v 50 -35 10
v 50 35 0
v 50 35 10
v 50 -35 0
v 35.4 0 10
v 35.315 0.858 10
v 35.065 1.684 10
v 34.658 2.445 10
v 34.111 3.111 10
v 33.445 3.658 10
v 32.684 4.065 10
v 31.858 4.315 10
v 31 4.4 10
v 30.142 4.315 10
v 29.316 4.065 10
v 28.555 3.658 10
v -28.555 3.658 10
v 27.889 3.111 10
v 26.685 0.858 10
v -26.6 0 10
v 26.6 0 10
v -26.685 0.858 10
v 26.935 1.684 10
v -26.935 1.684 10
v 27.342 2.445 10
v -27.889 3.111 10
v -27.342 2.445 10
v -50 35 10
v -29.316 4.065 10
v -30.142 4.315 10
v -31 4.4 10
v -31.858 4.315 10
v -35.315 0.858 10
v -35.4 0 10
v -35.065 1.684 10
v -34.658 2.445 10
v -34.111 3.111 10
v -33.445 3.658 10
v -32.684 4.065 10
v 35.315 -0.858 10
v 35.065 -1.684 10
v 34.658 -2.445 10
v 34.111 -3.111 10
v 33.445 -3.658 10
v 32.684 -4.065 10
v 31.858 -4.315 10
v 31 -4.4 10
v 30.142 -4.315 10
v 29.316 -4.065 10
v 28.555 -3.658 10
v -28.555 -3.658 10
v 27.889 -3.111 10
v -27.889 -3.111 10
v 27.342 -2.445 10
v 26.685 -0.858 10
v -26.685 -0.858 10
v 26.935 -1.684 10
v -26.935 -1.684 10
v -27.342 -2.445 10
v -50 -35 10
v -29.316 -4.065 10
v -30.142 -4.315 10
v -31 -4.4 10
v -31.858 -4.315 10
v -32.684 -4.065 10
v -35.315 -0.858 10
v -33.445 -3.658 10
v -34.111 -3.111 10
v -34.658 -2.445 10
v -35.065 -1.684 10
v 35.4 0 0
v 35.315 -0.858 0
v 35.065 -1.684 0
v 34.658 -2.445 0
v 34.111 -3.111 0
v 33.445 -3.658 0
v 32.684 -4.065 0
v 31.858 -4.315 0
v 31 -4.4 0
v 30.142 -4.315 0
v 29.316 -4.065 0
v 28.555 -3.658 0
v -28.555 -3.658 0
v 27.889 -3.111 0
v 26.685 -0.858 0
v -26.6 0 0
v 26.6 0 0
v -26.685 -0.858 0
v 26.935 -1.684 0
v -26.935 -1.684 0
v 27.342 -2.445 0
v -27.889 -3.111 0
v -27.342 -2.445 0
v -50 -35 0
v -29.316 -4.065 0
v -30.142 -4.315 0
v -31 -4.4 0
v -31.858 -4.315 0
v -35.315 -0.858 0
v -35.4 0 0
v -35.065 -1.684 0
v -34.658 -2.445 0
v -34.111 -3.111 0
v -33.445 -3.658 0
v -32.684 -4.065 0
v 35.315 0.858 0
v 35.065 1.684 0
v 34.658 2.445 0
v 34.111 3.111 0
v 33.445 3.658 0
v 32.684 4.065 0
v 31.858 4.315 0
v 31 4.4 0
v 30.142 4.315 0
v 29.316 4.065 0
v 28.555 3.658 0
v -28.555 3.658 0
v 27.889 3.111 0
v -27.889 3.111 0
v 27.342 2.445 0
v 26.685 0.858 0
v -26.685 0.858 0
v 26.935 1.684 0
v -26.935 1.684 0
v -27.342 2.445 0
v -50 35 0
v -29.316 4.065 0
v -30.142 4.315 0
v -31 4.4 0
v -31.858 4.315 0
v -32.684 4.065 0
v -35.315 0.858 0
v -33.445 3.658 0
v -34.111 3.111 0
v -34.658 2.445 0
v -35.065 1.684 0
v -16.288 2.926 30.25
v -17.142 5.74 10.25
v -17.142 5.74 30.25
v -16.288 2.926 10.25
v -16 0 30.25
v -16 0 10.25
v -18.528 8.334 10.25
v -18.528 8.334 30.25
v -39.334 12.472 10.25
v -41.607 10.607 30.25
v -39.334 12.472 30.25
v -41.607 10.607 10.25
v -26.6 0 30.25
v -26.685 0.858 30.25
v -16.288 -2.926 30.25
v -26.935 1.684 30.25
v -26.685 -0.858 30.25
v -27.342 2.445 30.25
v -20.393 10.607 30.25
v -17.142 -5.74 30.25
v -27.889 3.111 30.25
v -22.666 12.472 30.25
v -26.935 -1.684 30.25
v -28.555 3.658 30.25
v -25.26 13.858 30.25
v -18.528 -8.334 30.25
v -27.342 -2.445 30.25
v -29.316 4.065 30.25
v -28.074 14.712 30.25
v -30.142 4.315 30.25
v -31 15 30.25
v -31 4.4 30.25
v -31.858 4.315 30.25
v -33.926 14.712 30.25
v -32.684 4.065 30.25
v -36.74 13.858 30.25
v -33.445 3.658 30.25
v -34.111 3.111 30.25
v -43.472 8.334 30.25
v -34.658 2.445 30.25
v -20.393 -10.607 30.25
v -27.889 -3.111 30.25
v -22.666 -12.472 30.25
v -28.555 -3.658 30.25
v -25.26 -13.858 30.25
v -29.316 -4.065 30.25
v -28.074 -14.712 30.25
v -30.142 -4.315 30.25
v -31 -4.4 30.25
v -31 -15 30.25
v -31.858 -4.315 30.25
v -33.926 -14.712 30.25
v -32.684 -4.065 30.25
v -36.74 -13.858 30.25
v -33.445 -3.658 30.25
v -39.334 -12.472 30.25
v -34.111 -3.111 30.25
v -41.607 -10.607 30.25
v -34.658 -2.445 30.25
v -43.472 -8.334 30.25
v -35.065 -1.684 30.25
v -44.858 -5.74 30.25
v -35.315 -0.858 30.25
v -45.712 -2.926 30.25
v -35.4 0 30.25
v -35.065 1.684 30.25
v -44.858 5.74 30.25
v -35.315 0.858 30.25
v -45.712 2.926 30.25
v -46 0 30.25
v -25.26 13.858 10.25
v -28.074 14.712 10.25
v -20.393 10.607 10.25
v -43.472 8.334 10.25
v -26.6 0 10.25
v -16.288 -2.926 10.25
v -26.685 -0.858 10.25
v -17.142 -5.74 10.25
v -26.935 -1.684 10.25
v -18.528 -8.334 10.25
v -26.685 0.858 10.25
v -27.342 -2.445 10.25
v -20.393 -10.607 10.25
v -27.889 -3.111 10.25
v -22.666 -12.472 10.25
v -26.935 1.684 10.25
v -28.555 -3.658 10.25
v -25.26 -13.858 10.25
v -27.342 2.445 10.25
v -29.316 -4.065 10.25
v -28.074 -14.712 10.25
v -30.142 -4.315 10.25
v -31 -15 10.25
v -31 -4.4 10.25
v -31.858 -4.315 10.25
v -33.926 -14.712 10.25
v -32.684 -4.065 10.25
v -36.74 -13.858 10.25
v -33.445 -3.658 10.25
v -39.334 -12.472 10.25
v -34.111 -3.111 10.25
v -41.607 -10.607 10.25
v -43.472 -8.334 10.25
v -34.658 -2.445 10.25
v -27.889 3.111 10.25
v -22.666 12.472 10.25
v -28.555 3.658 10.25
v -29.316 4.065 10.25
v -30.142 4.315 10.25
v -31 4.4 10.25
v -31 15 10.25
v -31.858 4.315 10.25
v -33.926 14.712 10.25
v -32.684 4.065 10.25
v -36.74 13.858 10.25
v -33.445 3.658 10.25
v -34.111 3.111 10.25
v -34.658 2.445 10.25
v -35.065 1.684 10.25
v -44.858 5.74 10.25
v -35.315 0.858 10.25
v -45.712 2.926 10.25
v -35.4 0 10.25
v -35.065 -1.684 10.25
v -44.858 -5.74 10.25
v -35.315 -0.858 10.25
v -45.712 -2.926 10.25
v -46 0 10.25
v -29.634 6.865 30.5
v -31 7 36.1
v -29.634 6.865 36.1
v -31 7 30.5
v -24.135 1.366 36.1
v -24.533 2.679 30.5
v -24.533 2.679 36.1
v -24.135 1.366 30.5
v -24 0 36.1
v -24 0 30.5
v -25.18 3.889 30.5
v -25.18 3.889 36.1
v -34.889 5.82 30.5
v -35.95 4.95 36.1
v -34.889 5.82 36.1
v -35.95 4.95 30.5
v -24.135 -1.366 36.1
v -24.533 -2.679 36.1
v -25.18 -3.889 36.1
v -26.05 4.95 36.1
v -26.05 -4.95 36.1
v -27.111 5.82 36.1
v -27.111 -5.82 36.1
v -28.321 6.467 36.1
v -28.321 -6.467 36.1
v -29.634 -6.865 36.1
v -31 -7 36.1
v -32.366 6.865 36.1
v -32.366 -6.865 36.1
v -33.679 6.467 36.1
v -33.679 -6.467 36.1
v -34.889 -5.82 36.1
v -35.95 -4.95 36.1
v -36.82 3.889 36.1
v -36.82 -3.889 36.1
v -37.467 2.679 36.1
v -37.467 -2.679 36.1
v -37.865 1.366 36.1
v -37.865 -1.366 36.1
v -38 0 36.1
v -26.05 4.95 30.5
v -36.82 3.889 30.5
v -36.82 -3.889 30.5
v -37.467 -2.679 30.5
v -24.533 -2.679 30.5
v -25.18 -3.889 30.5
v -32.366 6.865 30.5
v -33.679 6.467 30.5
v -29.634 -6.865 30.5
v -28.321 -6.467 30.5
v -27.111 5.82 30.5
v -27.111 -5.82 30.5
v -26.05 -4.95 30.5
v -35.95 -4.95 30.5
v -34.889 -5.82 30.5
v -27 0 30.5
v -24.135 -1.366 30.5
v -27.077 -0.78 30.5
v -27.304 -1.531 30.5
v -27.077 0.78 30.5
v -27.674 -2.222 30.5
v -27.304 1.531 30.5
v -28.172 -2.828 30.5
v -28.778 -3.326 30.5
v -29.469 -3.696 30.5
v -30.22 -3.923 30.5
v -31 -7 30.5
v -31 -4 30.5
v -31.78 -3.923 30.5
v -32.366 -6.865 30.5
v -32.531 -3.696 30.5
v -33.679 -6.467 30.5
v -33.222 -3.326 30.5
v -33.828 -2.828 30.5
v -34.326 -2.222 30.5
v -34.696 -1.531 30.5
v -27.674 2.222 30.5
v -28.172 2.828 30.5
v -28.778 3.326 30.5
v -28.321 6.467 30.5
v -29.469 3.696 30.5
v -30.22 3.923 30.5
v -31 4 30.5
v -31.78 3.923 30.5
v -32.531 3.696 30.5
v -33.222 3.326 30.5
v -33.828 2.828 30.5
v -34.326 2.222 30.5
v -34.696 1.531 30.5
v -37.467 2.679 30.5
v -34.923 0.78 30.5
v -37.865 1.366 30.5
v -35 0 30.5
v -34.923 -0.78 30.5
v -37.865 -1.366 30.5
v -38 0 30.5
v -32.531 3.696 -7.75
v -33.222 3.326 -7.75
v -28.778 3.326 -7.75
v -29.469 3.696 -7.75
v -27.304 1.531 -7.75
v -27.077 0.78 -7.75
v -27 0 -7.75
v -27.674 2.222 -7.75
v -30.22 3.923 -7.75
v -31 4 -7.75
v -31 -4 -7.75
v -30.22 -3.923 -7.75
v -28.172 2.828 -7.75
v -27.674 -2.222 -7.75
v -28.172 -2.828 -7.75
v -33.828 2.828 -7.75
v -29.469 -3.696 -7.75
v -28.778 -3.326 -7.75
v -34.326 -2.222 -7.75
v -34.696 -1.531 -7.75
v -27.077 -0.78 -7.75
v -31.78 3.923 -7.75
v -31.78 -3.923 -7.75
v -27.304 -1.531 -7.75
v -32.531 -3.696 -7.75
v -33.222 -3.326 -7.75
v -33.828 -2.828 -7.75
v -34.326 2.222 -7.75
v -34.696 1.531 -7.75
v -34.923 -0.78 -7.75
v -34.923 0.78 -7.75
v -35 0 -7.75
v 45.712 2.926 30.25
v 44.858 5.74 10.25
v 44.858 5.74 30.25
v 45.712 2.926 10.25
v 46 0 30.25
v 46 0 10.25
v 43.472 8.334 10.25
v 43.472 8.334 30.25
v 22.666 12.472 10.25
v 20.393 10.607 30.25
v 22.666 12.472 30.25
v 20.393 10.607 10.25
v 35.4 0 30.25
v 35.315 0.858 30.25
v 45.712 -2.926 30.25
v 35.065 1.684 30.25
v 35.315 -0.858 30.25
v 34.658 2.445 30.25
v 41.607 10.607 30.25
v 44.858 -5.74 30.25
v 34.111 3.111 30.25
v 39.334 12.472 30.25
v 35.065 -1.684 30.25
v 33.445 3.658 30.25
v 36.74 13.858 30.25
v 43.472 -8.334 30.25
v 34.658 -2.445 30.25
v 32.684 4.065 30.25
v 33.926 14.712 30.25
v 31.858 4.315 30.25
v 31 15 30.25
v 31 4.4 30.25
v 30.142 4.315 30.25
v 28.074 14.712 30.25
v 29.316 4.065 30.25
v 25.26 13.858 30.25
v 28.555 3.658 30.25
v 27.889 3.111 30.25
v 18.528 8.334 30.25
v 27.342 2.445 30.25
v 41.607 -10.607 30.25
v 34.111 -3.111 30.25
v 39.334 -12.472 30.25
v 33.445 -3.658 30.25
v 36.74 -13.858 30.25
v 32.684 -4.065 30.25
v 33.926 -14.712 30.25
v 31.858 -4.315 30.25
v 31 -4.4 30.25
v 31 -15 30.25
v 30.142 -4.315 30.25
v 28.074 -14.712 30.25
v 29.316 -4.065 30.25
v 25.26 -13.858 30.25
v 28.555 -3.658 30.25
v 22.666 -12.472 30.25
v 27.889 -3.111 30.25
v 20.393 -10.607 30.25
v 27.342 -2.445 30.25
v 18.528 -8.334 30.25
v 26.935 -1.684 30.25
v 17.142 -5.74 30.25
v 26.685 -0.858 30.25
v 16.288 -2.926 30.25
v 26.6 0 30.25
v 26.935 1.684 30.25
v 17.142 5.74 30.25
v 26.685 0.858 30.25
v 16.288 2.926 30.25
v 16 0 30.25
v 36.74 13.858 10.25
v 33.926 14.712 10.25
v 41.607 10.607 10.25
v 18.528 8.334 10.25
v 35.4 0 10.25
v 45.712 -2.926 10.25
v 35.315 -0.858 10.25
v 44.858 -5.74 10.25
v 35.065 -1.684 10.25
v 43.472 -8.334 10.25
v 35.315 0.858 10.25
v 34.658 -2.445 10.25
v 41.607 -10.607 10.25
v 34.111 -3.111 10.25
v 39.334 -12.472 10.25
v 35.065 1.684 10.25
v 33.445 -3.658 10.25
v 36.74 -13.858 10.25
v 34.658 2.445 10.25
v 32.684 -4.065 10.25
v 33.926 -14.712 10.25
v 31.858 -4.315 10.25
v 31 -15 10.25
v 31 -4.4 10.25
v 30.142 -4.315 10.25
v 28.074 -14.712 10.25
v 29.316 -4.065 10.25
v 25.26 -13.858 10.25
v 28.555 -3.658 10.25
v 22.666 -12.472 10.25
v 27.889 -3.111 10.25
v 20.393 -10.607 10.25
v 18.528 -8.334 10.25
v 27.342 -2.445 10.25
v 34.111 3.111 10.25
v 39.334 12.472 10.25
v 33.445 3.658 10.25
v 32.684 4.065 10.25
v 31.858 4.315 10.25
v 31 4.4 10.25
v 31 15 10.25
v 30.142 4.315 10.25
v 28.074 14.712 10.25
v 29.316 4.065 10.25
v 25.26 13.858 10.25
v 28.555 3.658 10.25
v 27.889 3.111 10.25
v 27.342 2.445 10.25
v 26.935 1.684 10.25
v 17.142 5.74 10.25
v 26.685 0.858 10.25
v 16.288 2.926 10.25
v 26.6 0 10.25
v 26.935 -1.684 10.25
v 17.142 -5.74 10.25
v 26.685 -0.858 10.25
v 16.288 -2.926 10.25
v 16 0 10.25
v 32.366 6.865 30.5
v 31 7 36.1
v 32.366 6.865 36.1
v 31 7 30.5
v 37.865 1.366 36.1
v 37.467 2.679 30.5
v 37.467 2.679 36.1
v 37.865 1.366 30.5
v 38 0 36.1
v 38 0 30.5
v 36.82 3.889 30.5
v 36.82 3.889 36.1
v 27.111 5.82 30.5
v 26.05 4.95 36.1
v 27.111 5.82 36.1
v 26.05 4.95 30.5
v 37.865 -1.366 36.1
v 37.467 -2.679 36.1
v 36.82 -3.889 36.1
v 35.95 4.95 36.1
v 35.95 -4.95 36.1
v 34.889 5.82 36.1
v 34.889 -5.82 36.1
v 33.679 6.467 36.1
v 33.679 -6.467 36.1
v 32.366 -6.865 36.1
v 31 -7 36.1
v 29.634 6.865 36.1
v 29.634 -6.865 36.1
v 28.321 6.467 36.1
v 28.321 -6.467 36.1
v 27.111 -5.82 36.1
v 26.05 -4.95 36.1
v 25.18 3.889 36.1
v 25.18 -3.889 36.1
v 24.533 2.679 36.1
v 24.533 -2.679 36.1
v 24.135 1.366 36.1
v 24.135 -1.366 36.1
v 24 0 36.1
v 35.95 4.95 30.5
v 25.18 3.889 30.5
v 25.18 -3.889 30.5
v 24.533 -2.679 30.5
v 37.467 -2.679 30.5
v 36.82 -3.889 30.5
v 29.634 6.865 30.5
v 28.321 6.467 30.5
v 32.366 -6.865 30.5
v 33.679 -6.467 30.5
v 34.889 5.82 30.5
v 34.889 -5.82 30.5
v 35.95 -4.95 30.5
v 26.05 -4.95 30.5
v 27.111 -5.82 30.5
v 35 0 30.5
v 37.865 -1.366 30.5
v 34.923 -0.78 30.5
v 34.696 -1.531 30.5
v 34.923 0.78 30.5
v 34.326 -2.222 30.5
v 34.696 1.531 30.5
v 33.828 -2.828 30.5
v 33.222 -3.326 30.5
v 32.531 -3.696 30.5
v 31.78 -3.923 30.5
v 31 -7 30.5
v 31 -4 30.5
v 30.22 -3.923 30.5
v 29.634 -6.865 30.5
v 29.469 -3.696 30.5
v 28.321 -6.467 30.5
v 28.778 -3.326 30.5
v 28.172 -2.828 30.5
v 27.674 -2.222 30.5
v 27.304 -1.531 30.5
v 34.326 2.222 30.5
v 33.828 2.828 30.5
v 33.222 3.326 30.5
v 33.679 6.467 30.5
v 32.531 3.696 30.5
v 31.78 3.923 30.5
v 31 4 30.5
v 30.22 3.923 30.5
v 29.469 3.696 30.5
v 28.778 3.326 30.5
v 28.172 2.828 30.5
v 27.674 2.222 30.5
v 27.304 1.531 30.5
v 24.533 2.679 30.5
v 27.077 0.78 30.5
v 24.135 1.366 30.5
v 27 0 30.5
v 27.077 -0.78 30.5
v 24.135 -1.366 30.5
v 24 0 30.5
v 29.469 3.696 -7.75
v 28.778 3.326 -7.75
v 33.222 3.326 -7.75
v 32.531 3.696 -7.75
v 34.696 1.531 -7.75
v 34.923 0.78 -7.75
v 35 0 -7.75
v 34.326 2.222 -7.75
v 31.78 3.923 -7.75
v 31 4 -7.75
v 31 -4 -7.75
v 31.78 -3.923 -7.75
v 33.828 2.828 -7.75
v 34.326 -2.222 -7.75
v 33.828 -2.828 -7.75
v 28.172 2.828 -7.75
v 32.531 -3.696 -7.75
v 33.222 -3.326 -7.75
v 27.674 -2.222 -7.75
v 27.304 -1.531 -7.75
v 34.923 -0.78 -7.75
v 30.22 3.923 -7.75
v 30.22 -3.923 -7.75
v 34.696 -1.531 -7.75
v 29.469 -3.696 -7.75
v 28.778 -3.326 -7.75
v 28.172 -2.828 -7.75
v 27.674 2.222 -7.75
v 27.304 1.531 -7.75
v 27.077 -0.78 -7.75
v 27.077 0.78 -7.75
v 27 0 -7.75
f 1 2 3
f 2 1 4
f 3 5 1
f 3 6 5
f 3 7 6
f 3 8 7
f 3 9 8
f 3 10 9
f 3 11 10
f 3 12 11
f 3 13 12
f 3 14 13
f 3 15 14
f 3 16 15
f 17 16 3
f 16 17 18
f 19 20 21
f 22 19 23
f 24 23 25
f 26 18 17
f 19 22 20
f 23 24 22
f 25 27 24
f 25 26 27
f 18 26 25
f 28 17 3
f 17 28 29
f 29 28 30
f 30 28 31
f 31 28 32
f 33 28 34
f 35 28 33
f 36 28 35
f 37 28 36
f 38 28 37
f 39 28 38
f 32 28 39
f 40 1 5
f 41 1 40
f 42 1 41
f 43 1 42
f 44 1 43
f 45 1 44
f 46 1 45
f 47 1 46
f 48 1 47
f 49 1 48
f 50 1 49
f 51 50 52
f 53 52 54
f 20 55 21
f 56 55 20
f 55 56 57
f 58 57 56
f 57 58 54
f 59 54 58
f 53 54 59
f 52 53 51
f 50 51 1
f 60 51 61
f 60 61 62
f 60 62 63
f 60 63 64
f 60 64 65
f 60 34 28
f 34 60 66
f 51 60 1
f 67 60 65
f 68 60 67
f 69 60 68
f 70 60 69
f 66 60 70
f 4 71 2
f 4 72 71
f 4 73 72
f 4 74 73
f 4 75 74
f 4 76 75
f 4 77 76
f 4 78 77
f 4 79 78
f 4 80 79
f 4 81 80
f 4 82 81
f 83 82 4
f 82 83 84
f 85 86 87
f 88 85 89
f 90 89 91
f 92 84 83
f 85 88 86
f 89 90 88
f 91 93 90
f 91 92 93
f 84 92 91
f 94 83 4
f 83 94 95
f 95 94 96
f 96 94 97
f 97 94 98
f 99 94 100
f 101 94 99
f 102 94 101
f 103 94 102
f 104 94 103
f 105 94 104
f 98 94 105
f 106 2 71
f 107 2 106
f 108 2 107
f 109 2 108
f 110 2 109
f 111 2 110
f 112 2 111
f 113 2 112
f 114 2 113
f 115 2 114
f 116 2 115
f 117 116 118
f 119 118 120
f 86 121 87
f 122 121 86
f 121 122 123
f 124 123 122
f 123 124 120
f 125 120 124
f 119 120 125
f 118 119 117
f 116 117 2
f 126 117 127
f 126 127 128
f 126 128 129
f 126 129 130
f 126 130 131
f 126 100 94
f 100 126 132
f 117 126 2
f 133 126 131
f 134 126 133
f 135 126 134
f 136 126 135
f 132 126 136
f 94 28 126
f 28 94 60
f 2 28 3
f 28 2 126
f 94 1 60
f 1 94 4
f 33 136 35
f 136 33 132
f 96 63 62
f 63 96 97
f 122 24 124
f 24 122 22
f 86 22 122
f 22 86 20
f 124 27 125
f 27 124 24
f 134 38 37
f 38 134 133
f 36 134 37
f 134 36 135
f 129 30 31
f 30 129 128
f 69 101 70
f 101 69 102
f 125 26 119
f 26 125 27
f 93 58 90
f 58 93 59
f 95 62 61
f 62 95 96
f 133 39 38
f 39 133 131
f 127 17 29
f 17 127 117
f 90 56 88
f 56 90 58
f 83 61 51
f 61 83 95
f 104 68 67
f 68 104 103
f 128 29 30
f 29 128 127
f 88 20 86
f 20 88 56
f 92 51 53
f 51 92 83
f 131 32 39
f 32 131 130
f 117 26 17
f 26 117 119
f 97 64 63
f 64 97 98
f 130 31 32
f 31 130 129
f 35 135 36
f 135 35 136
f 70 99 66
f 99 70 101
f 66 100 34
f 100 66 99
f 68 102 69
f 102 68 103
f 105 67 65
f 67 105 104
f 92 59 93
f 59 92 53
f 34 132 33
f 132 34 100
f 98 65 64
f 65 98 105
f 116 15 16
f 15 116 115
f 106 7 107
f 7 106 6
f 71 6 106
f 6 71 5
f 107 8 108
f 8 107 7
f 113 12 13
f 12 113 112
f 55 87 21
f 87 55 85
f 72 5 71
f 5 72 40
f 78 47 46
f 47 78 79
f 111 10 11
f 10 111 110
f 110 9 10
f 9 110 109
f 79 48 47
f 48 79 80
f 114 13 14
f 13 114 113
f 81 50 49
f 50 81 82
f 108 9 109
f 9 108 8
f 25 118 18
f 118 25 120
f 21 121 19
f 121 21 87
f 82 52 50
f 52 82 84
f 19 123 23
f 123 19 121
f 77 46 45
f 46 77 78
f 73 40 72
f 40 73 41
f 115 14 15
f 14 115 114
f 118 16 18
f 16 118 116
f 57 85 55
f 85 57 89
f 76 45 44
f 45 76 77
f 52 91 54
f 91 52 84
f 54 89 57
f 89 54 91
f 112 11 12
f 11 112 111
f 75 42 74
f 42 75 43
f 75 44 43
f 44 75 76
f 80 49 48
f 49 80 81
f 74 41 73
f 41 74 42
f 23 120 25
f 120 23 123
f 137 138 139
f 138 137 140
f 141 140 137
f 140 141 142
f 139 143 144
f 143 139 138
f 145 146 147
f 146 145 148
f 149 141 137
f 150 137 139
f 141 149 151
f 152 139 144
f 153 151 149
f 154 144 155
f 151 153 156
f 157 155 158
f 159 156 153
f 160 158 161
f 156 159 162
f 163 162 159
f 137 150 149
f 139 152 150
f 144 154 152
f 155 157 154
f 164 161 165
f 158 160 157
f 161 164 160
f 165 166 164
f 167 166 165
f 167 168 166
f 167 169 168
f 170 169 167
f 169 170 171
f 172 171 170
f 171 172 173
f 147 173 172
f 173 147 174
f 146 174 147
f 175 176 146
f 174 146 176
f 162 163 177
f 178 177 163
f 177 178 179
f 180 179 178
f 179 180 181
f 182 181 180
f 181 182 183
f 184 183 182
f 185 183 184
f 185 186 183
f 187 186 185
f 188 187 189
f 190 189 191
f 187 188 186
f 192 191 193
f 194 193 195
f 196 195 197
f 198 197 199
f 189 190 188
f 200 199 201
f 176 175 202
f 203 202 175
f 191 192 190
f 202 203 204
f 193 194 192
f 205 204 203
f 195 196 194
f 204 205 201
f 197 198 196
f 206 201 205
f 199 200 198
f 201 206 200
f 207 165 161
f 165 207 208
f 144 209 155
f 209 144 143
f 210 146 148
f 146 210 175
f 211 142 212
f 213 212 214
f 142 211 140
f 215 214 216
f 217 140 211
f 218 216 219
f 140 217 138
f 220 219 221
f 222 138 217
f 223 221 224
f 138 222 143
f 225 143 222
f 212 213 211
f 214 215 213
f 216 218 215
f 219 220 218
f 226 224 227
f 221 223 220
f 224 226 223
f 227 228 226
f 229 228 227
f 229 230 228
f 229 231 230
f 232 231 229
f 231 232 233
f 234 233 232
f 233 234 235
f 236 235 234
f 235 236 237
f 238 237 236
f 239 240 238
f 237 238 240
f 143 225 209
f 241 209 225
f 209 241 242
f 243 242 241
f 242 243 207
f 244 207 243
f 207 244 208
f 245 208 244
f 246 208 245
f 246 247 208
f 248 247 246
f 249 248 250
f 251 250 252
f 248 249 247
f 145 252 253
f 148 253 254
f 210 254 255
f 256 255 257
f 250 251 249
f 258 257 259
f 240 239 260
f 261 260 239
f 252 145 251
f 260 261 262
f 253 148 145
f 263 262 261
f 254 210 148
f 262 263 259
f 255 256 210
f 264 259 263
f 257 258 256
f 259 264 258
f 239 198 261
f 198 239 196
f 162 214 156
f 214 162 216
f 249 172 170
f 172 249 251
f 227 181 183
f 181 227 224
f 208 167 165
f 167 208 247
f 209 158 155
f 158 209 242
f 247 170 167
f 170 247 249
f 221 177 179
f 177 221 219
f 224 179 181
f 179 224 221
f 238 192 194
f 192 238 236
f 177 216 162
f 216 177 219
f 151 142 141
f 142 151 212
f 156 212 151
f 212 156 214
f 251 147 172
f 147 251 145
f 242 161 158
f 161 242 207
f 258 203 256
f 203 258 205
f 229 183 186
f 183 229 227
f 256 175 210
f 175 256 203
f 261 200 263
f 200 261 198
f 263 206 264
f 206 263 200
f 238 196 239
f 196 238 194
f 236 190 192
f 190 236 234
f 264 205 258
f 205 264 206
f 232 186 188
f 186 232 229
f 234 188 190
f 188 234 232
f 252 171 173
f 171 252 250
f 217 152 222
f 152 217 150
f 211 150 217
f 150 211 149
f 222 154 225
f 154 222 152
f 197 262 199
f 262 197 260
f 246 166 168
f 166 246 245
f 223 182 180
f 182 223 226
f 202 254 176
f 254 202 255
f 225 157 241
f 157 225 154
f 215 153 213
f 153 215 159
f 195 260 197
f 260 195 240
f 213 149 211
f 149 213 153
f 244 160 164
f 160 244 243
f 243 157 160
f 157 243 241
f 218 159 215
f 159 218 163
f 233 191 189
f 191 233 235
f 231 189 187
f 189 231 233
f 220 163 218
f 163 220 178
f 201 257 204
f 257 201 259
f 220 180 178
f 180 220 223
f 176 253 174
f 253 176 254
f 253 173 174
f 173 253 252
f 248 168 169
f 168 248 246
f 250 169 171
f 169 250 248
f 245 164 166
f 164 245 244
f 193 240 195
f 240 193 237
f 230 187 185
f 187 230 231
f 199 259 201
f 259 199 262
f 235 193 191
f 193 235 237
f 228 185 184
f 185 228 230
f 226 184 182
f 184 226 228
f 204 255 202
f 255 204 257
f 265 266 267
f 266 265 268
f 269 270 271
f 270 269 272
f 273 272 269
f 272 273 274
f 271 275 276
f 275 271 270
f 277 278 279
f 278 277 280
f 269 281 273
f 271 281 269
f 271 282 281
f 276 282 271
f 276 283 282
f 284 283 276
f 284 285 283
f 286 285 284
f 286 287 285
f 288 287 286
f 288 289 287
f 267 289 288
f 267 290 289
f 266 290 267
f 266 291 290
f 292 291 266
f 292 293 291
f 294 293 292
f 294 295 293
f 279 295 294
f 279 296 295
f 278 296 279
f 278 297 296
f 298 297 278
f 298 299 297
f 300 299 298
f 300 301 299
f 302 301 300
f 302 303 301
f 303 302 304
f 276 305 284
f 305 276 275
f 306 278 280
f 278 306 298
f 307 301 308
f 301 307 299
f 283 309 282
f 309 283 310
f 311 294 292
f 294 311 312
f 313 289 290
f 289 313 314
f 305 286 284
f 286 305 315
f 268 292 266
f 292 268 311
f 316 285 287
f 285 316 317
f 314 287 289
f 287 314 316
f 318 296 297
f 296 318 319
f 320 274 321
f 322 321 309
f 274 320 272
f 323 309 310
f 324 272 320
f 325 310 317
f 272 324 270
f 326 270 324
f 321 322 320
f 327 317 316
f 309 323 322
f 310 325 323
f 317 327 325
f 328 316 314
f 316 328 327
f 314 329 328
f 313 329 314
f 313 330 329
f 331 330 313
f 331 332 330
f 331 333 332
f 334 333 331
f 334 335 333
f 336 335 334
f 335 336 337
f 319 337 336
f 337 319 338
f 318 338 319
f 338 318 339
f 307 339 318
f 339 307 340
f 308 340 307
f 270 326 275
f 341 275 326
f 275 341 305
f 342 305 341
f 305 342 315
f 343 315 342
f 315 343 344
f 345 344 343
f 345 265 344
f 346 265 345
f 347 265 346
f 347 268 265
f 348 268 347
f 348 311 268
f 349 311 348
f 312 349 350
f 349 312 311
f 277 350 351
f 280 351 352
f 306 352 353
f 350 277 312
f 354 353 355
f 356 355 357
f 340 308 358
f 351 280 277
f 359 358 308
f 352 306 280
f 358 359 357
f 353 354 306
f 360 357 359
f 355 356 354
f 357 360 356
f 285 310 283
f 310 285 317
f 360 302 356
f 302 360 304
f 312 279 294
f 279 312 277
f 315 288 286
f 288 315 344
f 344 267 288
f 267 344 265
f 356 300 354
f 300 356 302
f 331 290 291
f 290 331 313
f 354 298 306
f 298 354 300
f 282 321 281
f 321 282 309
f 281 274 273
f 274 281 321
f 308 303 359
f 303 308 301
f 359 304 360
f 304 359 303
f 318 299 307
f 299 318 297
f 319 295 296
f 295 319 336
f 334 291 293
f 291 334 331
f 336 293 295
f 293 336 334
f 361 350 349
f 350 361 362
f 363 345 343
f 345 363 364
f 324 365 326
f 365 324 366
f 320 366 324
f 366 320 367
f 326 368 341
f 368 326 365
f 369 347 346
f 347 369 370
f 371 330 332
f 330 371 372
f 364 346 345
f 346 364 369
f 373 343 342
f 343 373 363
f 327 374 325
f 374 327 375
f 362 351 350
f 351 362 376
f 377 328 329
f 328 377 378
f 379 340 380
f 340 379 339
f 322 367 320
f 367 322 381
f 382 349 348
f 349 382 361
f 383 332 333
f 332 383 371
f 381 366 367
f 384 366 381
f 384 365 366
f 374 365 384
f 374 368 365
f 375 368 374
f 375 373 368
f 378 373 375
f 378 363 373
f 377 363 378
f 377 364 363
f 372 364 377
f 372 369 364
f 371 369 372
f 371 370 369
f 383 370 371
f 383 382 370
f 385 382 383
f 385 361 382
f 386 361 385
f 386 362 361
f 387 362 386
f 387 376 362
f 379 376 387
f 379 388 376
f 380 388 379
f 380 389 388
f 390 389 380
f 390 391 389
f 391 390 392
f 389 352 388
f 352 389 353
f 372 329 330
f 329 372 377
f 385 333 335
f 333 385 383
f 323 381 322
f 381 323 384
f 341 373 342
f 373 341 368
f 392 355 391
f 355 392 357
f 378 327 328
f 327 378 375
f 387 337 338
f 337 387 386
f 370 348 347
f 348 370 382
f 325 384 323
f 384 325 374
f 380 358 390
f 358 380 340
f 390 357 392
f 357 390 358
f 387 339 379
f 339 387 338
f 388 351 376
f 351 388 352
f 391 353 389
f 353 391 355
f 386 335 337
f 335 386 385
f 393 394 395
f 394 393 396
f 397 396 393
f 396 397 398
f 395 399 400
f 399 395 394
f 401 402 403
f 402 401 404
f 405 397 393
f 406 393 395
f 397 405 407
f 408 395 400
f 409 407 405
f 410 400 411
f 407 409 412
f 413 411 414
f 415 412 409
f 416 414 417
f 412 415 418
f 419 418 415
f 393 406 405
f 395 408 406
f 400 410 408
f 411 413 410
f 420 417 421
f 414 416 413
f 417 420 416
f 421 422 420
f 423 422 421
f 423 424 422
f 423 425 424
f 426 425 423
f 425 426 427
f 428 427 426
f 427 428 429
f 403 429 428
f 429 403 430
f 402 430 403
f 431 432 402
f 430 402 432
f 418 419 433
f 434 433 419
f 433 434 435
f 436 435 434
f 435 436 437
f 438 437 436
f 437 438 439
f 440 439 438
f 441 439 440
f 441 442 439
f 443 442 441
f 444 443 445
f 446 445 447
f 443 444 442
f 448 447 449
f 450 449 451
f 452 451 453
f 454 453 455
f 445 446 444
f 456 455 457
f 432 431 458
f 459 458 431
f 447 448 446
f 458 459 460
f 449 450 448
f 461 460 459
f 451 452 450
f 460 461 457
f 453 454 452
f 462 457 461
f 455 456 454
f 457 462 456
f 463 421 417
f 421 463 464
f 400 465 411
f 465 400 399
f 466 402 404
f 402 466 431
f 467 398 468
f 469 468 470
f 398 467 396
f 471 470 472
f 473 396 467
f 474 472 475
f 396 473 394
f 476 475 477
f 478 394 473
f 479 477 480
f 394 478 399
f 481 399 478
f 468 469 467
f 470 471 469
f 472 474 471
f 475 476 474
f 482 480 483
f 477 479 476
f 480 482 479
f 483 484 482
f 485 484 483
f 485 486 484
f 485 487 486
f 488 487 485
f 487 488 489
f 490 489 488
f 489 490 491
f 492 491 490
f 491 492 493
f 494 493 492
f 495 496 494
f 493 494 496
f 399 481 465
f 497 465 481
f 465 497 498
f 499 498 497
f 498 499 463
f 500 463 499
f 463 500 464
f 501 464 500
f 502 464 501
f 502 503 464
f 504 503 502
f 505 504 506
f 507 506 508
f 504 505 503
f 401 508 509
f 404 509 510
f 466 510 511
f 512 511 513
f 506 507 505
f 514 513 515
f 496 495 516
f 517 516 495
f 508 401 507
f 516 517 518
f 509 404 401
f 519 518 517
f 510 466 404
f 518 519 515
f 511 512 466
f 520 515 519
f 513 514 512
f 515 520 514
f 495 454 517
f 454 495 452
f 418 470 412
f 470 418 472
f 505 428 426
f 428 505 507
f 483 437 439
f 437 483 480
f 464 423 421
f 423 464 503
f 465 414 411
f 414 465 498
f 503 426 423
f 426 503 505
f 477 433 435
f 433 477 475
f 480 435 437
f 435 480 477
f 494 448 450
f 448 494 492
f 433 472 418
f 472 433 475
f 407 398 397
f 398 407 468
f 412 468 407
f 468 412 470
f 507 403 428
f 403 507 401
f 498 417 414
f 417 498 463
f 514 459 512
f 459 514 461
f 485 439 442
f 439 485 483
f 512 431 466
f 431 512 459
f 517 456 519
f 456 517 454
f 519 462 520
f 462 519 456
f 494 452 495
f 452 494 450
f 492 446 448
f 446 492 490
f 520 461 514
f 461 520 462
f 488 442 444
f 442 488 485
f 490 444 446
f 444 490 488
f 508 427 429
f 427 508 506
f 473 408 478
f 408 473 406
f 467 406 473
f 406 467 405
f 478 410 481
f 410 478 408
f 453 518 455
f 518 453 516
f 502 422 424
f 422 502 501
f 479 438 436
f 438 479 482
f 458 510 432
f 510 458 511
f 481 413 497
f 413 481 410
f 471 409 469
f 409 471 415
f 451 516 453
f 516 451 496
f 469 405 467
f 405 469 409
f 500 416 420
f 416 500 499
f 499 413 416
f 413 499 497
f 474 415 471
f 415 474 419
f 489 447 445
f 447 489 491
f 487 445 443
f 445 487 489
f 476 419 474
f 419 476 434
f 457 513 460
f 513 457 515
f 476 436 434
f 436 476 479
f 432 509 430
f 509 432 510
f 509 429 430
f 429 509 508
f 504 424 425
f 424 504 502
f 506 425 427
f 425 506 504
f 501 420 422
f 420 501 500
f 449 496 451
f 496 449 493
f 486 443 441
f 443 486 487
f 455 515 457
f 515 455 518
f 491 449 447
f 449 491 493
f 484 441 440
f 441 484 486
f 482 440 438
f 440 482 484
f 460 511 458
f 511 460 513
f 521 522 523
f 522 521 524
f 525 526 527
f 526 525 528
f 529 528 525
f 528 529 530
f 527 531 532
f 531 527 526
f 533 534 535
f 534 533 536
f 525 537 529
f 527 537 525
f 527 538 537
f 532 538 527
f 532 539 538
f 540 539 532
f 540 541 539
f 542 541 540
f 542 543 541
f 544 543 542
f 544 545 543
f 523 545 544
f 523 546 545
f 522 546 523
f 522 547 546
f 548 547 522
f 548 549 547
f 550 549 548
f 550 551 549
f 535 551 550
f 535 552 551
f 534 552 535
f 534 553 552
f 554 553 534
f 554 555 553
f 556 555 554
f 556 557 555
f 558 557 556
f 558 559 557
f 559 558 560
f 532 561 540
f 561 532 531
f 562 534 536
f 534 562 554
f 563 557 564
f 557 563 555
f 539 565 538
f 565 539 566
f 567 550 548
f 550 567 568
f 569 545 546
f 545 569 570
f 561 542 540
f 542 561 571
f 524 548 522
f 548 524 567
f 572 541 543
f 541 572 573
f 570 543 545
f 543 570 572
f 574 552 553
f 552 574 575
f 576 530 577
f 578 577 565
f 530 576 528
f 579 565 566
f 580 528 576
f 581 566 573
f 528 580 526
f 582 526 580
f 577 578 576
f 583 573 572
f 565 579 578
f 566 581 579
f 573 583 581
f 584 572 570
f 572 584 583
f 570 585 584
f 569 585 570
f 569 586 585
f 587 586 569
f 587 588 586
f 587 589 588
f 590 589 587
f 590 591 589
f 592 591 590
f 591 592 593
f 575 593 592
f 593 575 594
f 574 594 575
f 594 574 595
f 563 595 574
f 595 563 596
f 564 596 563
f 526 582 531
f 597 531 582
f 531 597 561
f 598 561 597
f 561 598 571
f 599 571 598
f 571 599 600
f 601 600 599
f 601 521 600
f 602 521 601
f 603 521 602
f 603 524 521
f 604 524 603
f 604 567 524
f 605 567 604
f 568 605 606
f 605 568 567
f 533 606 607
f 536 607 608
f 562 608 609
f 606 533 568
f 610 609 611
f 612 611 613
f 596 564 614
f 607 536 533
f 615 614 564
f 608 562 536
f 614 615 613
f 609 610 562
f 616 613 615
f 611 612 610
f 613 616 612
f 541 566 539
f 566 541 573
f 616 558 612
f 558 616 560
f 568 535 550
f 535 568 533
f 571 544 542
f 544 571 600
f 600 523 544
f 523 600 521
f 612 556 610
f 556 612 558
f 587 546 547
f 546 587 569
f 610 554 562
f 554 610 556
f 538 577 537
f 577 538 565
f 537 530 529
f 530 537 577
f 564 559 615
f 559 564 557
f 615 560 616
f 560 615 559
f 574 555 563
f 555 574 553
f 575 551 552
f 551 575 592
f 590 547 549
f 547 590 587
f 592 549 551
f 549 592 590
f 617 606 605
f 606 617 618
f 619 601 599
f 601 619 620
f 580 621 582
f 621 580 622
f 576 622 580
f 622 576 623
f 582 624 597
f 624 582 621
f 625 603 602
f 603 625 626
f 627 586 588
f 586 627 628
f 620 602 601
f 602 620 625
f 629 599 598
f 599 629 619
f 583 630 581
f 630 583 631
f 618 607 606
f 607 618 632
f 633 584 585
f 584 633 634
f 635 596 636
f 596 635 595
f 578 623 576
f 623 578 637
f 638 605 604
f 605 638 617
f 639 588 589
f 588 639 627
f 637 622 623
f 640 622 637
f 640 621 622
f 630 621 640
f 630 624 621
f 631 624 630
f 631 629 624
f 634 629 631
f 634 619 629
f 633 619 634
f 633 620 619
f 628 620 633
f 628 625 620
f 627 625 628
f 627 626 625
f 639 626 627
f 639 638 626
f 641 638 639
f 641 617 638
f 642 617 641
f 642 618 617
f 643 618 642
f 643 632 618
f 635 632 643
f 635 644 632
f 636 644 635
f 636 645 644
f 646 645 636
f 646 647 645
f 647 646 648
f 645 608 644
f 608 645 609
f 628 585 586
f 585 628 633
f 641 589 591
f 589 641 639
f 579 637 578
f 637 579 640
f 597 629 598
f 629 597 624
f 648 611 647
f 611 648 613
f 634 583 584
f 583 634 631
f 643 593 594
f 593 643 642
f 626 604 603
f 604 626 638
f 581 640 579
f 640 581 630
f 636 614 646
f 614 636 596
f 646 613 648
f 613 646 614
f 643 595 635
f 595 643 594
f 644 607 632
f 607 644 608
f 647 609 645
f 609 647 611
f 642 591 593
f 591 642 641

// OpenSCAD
$fn = 32;

// ------------------------------------------------------------------------
// Standoff columns: 2 d30 standoffs, bolts d8
// Every part is its own module, assembly() places them once.
// ------------------------------------------------------------------------

// --- part 1 ---
module base_plate() {
  difference() {
    translate([-50, -35, 0]) cube([100, 70, 10]);
    translate([-31, 0, -1]) cylinder(h = 12, d = 8.8);
    translate([31, 0, -1]) cylinder(h = 12, d = 8.8);
  }
}

// --- part 2 ---
module spacer1() {
  difference() {
      translate([0, 0, 0]) cylinder(h = 20, d = 30);
      translate([0, 0, -1]) cylinder(h = 22, d = 8.8);
    }
}

// --- part 3 ---
module bolt1() {
  cylinder(h = 5.6, d = 14);
  translate([0, 0, -38.25]) cylinder(h = 38.25, d = 8);
}

// --- part 4 ---
module spacer2() {
  difference() {
      translate([0, 0, 0]) cylinder(h = 20, d = 30);
      translate([0, 0, -1]) cylinder(h = 22, d = 8.8);
    }
}

// --- part 5 ---
module bolt2() {
  cylinder(h = 5.6, d = 14);
  translate([0, 0, -38.25]) cylinder(h = 38.25, d = 8);
}

// --- assembly ---
module assembly() {
  translate([0, 0, 0]) rotate([0, 0, 0]) base_plate();
  translate([-31, 0, 10.25]) rotate([0, 0, 0]) spacer1();
  translate([-31, 0, 30.5]) rotate([0, 0, 0]) bolt1();
  translate([31, 0, 10.25]) rotate([0, 0, 0]) spacer2();
  translate([31, 0, 30.5]) rotate([0, 0, 0]) bolt2();
}

assembly();
